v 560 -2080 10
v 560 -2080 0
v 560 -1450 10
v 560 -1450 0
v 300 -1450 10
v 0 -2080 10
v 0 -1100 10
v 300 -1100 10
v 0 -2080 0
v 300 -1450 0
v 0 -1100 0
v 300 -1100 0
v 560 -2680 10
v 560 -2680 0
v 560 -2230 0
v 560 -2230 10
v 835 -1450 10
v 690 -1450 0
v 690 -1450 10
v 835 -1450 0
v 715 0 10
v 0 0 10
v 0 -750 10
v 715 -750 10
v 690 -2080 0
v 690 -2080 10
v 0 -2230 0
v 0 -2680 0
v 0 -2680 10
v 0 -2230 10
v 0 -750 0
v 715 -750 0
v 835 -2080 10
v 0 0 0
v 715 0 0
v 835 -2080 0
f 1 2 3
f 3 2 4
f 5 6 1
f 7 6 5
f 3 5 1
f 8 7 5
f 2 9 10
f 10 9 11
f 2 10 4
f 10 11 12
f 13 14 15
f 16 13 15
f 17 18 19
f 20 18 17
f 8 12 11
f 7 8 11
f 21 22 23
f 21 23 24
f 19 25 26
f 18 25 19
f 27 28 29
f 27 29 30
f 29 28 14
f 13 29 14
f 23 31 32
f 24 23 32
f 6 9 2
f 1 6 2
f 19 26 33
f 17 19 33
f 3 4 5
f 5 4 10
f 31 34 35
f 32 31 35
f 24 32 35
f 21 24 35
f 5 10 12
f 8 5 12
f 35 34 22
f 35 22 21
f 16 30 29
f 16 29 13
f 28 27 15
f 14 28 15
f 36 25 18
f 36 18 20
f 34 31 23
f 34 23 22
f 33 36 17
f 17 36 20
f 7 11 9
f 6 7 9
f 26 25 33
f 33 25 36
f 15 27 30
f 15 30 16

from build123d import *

# Parameters (mm, degrees)
F0_W     = 715
F0_H     = 750
F1_DEPTH = 10
F3_DEPTH = 10
F4_W     = 145
F4_H     = 630
F5_DEPTH = 10
F6_W     = 560
F6_H     = 450
F7_DEPTH = 10


with BuildPart() as f1:
    # F0 (on Top) → F1 (new body)
    with BuildSketch(Plane.XY):
        with Locations((357.5, -375)):
            Rectangle(F0_W, F0_H)
    extrude(amount=F1_DEPTH)


with BuildPart() as f3:
    # F2 (on Top) → F3 (new body)
    with BuildSketch(Plane.XY):
        Polygon((300, -1100), (0, -1100), (0, -2080), (560, -2080), (560, -1450), (300, -1450), align=None)
    extrude(amount=F3_DEPTH)


with BuildPart() as f5:
    # F4 (on Top) → F5 (new body)
    with BuildSketch(Plane.XY):
        with Locations((762.5, -1765)):
            Rectangle(F4_W, F4_H)
    extrude(amount=F5_DEPTH)


with BuildPart() as f7:
    # F6 (on Top) → F7 (new body)
    with BuildSketch(Plane.XY):
        with Locations((280, -2455)):
            Rectangle(F6_W, F6_H)
    extrude(amount=F7_DEPTH)


solid = Compound([f1.part, f3.part, f5.part, f7.part])
